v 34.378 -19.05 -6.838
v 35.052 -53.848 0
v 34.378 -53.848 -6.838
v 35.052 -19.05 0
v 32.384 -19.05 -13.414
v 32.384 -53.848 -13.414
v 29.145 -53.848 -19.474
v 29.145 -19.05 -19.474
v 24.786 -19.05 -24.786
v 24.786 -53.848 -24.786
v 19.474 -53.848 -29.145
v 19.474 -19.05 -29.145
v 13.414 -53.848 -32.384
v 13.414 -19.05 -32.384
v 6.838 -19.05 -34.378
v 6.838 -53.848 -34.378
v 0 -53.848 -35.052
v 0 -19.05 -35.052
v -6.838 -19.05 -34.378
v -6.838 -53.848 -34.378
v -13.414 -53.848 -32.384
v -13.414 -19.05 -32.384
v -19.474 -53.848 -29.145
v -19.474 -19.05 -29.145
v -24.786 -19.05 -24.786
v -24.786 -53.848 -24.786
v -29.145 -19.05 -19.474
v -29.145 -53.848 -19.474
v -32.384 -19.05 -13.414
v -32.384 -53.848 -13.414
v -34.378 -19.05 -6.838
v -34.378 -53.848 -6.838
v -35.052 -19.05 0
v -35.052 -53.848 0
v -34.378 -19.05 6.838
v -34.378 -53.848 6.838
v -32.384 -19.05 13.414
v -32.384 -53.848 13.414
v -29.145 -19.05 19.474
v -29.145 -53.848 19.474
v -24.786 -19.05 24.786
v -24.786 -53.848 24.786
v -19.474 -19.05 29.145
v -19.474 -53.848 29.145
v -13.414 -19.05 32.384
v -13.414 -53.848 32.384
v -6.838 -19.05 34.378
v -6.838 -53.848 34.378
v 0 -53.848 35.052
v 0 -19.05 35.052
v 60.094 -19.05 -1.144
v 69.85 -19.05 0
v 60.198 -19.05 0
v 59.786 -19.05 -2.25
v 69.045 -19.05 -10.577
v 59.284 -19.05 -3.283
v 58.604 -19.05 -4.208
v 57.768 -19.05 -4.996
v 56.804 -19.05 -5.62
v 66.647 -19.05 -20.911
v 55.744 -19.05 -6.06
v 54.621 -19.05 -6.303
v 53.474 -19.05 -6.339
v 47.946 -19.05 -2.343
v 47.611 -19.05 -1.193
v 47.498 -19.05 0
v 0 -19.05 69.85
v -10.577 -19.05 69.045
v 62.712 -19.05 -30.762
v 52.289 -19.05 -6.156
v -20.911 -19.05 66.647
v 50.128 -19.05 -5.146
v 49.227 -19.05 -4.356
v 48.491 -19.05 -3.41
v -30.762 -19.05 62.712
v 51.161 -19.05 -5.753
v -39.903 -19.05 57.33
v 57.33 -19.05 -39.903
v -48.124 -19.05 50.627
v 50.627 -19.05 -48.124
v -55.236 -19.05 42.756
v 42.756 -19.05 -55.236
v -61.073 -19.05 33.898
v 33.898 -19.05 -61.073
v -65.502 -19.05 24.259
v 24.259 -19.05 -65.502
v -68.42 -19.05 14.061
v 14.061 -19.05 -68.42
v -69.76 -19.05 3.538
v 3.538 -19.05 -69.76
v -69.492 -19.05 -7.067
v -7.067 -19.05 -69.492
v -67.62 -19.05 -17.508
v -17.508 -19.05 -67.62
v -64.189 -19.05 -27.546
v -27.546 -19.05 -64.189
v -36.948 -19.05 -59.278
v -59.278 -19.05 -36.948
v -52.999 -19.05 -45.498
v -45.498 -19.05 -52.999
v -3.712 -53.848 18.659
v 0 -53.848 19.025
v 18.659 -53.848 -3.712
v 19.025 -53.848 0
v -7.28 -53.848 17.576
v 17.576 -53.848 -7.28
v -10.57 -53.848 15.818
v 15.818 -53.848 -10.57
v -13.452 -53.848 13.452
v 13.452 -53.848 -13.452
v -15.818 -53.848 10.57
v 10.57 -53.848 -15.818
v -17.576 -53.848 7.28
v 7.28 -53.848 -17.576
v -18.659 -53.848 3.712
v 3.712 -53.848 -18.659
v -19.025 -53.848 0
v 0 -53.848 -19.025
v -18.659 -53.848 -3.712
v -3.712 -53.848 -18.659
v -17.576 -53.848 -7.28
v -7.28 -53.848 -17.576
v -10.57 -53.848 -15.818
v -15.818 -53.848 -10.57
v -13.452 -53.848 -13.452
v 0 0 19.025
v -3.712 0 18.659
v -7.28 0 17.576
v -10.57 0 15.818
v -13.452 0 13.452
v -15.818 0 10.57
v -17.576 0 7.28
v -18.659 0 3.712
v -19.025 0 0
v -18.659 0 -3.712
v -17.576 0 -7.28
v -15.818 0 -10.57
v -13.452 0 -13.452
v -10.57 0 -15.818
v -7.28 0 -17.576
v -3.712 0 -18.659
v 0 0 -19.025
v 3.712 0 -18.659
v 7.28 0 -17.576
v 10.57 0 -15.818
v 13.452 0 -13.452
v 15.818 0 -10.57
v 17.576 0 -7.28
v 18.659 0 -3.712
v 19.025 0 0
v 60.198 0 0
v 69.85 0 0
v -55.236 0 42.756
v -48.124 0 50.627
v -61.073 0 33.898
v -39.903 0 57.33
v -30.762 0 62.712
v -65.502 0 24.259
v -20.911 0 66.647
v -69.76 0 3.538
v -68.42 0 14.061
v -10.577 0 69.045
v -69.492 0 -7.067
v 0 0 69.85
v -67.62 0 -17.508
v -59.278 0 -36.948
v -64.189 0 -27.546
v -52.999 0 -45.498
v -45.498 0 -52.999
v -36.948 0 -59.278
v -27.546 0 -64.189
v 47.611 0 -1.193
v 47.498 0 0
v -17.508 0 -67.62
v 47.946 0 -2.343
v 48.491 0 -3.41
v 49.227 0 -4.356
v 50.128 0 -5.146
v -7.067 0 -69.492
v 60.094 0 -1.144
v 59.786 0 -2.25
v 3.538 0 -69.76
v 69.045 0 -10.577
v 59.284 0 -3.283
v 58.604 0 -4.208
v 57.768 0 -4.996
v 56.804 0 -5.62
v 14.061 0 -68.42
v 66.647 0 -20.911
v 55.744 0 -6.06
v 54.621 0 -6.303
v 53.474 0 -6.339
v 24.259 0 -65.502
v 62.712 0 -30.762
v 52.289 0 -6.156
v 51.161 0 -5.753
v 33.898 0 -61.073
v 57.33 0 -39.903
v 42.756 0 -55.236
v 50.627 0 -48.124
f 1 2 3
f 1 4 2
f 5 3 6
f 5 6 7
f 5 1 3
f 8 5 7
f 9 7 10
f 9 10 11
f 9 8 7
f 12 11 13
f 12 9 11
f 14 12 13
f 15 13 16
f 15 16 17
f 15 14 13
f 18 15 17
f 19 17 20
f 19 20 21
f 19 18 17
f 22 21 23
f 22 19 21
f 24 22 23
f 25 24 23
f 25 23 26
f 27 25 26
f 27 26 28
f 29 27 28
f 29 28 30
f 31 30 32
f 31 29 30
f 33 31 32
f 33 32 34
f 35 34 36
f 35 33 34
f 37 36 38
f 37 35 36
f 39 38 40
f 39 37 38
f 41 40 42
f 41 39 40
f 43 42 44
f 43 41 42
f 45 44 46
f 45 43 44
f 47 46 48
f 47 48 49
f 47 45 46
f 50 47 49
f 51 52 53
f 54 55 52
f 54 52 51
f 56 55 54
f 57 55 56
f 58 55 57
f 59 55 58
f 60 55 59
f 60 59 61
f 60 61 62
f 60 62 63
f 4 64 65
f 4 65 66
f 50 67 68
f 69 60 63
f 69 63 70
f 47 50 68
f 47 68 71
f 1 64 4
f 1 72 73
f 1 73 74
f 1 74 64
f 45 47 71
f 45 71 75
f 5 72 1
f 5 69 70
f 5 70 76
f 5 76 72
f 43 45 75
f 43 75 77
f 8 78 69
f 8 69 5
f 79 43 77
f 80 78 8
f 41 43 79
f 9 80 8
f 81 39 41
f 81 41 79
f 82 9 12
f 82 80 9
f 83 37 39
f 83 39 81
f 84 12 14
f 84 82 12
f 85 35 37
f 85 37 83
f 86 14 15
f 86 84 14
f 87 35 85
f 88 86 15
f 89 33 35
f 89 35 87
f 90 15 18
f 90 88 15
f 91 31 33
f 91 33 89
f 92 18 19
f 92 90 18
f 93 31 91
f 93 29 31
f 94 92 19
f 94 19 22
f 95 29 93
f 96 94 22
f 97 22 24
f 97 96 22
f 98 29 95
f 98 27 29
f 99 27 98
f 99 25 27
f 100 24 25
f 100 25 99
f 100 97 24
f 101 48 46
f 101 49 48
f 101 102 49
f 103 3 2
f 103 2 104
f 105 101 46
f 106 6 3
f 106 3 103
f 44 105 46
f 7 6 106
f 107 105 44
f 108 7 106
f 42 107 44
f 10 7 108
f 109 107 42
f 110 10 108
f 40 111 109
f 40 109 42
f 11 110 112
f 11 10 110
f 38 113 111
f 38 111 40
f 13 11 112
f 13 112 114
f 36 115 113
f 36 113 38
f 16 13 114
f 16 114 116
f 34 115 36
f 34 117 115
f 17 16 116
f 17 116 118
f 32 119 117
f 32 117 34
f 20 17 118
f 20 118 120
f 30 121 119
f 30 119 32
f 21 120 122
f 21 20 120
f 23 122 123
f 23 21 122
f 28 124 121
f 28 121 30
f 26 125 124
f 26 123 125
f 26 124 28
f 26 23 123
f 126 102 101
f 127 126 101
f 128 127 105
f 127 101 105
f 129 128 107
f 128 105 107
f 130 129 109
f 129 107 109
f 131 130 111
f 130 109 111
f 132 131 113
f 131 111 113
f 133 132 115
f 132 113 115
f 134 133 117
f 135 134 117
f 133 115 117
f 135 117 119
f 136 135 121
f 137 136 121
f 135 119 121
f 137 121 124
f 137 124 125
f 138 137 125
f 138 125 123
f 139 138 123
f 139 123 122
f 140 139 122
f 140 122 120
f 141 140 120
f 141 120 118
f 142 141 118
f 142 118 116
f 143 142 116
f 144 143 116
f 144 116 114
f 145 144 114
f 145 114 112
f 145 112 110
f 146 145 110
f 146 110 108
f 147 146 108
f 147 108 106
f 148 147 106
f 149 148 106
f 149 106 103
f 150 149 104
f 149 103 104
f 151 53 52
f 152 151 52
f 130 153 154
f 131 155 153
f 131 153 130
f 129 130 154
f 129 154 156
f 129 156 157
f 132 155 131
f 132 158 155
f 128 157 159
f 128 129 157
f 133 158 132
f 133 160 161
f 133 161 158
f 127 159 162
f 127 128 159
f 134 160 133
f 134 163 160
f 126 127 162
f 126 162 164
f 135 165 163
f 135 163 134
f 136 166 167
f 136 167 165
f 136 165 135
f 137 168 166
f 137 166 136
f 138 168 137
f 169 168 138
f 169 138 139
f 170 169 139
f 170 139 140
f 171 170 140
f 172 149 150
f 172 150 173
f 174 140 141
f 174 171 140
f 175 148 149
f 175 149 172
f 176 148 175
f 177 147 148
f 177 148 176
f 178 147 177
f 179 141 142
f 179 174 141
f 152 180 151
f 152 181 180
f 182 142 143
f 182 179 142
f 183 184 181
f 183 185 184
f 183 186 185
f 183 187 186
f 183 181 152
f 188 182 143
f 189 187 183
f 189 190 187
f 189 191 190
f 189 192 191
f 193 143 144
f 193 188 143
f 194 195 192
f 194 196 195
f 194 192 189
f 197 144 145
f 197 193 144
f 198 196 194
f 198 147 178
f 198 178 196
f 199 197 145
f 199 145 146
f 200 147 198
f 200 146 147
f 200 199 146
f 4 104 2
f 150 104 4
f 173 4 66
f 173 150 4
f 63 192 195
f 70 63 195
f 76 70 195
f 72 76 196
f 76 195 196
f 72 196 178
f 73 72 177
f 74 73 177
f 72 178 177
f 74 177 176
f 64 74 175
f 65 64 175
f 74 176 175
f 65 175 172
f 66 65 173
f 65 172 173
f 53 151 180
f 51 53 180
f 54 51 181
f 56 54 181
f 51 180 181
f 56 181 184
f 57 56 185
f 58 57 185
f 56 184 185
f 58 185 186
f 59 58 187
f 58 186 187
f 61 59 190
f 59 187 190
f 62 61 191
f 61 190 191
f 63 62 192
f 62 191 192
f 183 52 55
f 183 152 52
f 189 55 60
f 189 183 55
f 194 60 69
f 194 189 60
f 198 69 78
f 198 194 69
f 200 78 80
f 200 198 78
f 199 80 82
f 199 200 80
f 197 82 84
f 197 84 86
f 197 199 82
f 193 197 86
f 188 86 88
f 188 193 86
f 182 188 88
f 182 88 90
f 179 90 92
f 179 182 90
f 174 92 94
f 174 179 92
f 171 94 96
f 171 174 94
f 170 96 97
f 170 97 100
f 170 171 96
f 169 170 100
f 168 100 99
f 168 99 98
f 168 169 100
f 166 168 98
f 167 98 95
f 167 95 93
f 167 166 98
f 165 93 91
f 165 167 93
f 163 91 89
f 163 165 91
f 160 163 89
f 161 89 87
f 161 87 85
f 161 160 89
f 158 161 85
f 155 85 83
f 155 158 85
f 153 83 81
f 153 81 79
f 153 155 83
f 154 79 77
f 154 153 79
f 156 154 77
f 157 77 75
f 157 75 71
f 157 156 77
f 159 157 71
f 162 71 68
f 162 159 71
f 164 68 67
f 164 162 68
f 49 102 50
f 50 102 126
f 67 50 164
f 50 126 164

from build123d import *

# Parameters (mm, degrees)
F1_ANGLE = 270
F3_DEPTH = 25.4
F5_DEPTH = 76.2


with BuildPart() as f1:
    # F0 (on Top) → F1 (revolve)
    with BuildSketch(Plane.XY):
        Polygon((69.85, 0), (0, 0), (0, -53.848), (35.052, -53.848), (35.052, -19.05), (69.85, -19.05), align=None)
    revolve(axis=Axis((0, -26.924, 0), (0, 1, 0)), revolution_arc=F1_ANGLE)

    # F2 (on face) → F3 (cut)
    with BuildSketch(Plane(origin=(0, 0, 0), x_dir=(-1, 0, 0), z_dir=(0, 1, 0))):
        with BuildLine():
            ThreePointArc((-60.198, 0), (-58.2037429965, -4.6206063399), (-53.4735896226, -6.3389523479))
            ThreePointArc((-53.4735896226, -6.3389523479), (-53.7543159104, -3.175), (-53.848, 0))
            Line((-53.848, 0), (-60.198, 0))
        make_face()
        with BuildLine():
            ThreePointArc((-53.848, 0), (-53.7543159104, -3.175), (-53.4735896226, -6.3389523479))
            ThreePointArc((-53.4735896226, -6.3389523479), (-49.2273936601, -4.3557429965), (-47.498, 0))
            Line((-47.498, 0), (-53.848, 0))
        make_face()
    extrude(amount=-F3_DEPTH, mode=Mode.SUBTRACT)

    # F4 (on face) → F5 (cut)
    with BuildSketch(Plane.XZ.offset(53.848)):
        with BuildLine():
            ThreePointArc((0, 19.0246), (-13.4524236694, -13.4524236694), (19.0246, 0))
            Line((19.0246, 0), (0, 0))
            Line((0, 0), (0, 19.0246))
        make_face()
    extrude(amount=-F5_DEPTH, mode=Mode.SUBTRACT)


solid = f1.part
